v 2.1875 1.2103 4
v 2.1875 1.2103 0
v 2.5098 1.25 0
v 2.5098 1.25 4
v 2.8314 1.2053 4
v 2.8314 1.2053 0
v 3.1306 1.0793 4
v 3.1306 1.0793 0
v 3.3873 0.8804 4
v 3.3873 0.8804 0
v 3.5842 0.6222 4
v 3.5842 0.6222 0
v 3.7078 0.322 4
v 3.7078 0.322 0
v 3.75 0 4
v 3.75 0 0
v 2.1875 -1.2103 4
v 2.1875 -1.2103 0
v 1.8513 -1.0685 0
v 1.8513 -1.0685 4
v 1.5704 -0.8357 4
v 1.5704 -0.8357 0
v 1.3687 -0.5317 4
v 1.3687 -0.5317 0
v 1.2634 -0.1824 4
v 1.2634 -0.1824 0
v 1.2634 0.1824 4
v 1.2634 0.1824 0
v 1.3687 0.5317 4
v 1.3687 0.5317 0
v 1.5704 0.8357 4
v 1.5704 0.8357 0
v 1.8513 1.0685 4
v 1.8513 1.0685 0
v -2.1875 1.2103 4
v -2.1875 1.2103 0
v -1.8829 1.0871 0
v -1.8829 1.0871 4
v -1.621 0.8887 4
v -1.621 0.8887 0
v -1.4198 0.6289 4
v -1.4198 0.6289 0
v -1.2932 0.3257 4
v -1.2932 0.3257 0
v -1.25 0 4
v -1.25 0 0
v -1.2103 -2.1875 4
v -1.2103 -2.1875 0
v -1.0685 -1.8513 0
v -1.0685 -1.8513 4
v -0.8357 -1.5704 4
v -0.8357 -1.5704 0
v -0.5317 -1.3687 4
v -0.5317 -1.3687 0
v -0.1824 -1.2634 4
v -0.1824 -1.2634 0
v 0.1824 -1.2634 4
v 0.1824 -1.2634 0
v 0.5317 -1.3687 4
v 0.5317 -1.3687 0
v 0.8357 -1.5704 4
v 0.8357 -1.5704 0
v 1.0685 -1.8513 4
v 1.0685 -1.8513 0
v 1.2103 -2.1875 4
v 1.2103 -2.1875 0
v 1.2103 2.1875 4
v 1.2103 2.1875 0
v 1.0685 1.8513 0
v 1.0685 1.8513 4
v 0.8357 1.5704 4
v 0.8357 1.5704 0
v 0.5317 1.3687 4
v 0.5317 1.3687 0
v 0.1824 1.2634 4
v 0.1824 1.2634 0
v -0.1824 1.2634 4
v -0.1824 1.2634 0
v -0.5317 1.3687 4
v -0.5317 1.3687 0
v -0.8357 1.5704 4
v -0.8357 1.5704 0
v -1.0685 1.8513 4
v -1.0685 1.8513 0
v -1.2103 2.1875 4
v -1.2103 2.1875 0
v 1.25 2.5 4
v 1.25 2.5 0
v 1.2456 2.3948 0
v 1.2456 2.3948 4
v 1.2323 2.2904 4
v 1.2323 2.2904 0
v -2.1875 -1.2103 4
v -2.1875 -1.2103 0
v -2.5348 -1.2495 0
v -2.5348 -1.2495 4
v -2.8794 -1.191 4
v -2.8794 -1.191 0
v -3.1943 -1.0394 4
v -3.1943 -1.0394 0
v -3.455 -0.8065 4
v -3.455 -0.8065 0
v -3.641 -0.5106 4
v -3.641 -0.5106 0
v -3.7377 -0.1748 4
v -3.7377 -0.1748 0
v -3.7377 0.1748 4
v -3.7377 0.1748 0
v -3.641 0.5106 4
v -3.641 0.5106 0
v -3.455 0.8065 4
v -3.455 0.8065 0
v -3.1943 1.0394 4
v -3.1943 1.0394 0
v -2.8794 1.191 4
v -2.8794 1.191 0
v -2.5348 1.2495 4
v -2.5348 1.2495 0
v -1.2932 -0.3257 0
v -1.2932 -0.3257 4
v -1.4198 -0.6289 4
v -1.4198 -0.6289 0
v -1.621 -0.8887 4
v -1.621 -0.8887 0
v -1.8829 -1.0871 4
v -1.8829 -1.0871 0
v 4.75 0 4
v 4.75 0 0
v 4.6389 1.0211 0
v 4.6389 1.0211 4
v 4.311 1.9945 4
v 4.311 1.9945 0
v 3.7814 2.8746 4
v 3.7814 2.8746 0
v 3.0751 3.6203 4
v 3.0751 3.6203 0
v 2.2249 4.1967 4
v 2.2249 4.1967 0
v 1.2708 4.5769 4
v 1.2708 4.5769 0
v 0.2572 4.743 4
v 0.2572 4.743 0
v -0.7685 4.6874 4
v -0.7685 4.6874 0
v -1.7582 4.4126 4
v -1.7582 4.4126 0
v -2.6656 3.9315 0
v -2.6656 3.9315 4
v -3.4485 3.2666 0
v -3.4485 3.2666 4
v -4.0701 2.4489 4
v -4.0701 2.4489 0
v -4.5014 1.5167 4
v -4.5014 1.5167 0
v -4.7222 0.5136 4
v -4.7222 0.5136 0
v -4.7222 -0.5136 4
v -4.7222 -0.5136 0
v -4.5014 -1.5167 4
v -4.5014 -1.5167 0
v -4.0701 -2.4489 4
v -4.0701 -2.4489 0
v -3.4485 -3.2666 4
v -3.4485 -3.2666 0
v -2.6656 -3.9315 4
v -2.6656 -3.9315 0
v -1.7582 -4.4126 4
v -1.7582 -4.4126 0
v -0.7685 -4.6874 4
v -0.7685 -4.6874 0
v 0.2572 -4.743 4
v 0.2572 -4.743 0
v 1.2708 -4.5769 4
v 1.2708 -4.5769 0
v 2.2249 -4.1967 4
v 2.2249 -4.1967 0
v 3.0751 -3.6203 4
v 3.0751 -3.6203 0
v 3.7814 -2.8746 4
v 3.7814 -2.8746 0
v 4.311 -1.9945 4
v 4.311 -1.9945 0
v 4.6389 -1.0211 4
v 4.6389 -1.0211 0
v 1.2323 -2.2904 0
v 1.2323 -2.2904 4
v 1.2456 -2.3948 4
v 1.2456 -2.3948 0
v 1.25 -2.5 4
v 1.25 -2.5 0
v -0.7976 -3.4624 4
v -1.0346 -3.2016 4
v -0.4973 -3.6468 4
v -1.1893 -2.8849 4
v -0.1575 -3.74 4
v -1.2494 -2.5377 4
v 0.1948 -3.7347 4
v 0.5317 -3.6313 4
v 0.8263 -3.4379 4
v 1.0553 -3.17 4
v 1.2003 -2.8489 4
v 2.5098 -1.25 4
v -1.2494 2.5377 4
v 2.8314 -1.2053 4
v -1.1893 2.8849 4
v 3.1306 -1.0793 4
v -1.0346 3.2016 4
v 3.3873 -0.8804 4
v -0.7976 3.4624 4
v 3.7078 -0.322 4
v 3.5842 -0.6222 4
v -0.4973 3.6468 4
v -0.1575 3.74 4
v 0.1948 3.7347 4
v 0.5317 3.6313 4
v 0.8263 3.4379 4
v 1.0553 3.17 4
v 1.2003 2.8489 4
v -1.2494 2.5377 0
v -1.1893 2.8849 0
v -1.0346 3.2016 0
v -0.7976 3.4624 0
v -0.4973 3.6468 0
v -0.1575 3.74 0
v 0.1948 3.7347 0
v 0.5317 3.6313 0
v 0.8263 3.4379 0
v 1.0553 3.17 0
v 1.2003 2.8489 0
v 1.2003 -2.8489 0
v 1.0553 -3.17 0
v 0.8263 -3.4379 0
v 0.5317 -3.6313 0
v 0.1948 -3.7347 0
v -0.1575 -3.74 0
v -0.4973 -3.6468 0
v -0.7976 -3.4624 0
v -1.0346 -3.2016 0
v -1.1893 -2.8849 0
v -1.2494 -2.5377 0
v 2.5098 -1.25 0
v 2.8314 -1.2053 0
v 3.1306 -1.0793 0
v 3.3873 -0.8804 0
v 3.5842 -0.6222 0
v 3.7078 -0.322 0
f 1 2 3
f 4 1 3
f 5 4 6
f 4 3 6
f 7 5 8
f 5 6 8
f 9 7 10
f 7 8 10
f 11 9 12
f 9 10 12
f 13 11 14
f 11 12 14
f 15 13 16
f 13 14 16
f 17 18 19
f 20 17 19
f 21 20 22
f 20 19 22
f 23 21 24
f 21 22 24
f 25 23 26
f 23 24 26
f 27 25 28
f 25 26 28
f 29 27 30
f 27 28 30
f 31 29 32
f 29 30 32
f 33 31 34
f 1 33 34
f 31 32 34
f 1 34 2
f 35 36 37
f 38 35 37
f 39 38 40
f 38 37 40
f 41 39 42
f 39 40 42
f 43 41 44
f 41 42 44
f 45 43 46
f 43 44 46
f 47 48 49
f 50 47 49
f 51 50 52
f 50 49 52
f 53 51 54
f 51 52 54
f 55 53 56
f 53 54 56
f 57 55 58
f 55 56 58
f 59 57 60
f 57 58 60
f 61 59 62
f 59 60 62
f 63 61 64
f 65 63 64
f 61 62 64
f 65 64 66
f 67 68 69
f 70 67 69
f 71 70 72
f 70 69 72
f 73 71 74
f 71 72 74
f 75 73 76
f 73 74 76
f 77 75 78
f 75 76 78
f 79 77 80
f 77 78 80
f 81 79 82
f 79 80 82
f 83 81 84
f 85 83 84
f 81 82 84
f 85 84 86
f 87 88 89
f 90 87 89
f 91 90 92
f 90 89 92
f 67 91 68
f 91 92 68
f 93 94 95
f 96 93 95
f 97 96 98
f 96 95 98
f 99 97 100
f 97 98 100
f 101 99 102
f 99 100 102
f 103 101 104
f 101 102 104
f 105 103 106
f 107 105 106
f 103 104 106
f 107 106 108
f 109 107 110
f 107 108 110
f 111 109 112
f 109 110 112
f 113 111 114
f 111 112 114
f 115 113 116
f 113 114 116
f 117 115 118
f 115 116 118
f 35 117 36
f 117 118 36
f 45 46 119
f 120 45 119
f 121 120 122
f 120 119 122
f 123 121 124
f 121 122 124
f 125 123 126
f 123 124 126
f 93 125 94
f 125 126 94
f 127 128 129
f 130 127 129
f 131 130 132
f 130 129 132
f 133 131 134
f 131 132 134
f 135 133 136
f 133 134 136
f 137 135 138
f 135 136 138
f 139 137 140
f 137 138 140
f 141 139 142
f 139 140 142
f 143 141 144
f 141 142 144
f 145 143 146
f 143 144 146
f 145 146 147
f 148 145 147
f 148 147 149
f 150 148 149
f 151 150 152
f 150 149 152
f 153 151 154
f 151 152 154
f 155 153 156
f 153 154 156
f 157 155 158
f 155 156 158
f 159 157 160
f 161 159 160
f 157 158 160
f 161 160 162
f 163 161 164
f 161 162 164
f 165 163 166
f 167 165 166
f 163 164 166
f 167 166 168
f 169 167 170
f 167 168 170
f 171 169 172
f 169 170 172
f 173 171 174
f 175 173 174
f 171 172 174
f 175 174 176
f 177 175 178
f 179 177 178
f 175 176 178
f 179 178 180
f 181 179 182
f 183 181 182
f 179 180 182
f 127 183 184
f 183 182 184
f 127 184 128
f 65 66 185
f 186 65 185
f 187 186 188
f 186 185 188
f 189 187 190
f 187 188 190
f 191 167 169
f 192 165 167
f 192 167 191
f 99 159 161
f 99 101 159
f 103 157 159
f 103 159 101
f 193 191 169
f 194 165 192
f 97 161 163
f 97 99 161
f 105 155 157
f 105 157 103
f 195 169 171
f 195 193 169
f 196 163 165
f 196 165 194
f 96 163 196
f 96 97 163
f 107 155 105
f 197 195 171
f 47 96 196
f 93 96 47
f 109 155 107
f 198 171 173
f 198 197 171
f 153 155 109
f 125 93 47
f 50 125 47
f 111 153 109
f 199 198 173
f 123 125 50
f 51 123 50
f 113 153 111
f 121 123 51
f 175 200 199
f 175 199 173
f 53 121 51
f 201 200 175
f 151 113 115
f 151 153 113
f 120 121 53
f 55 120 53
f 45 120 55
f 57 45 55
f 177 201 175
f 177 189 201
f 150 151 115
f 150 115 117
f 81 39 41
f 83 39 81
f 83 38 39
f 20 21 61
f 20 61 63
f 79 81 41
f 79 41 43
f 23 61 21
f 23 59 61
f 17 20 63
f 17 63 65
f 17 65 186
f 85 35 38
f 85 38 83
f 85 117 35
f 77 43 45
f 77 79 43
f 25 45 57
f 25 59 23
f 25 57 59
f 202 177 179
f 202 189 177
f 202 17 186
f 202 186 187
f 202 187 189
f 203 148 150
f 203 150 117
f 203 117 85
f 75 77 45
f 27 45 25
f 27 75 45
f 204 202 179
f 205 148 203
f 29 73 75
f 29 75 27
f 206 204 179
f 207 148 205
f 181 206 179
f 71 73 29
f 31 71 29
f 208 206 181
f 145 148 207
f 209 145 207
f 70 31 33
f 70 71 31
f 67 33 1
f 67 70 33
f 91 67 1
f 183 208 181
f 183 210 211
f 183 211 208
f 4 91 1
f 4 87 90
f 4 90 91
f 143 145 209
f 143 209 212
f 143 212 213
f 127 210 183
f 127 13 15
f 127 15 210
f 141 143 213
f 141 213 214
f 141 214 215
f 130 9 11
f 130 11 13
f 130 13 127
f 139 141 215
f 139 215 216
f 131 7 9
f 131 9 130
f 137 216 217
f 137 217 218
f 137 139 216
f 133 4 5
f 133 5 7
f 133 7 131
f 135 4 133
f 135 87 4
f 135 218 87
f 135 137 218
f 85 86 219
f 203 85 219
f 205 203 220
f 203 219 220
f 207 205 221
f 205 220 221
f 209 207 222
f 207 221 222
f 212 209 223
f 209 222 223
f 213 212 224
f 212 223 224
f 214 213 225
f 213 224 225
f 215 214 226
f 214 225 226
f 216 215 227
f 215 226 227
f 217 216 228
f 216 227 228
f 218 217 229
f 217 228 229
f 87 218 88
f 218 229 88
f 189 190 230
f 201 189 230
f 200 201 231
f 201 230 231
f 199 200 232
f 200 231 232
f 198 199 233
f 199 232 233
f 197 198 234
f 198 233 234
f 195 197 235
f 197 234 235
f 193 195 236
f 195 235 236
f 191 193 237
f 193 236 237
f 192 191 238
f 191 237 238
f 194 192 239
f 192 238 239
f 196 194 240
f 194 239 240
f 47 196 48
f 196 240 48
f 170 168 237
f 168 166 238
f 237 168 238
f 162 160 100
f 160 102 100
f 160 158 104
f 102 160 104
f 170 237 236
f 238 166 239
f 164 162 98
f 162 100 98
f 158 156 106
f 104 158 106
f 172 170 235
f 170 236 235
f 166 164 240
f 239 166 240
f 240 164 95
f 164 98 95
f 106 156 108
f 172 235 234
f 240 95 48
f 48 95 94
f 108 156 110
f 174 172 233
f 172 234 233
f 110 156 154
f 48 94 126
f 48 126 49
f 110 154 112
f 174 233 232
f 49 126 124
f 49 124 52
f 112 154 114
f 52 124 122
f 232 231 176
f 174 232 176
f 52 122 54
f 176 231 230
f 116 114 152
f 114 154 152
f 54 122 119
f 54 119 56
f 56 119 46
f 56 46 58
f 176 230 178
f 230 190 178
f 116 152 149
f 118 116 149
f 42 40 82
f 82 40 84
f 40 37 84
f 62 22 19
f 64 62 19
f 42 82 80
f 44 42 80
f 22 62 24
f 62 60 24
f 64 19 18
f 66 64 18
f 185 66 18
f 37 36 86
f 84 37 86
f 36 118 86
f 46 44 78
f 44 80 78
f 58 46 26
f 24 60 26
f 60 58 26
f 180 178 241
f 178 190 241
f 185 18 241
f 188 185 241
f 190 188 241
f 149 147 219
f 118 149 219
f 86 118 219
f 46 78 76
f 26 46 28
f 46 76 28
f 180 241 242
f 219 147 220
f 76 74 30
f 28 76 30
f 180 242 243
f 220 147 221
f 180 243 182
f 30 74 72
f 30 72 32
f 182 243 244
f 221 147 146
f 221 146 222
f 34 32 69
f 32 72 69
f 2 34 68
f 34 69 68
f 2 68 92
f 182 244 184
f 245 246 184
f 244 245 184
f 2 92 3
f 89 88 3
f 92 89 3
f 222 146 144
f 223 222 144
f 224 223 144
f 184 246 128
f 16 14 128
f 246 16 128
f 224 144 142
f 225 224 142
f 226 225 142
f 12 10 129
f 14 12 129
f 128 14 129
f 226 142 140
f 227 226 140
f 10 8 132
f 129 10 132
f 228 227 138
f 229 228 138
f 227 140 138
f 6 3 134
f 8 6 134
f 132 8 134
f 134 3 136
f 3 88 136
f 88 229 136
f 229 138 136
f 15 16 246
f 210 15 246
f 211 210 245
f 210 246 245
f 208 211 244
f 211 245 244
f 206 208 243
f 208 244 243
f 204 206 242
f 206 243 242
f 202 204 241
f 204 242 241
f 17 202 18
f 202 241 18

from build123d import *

# Parameters (mm, degrees)
CROQUIS1_R              = 4.75
SALIENTE_EXTRUIR1_DEPTH = 4


with BuildPart() as part:
    # Croquis1 → Saliente-Extruir1 (new body)
    # profile 1 of 2: a face of its own
    with BuildSketch(Plane.XY):
        Circle(CROQUIS1_R)
        with BuildLine():
            ThreePointArc((-2.1875, 1.210307296), (-1.767766953, 1.767766953), (-1.210307296, 2.1875))
            ThreePointArc((-1.210307296, 2.1875), (-0.157505366, 3.74003712), (1.25, 2.5))
            ThreePointArc((1.25, 2.5), (1.24003712, 2.342494634), (1.210307296, 2.1875))
            ThreePointArc((1.210307296, 2.1875), (1.767766953, 1.767766953), (2.1875, 1.210307296))
            ThreePointArc((2.1875, 1.210307296), (3.265465545, 0.988211769), (3.75, 0))
            ThreePointArc((3.75, 0), (3.265465545, -0.988211769), (2.1875, -1.210307296))
            ThreePointArc((2.1875, -1.210307296), (1.767766953, -1.767766953), (1.210307296, -2.1875))
            ThreePointArc((1.210307296, -2.1875), (1.24003712, -2.342494634), (1.25, -2.5))
            ThreePointArc((1.25, -2.5), (-0.157505366, -3.74003712), (-1.210307296, -2.1875))
            ThreePointArc((-1.210307296, -2.1875), (-1.767766953, -1.767766953), (-2.1875, -1.210307296))
            ThreePointArc((-2.1875, -1.210307296), (-3.75, 0), (-2.1875, 1.210307296))
        make_face(mode=Mode.SUBTRACT)
    # profile 2 of 2: a face of its own
    with BuildSketch(Plane.XY):
        with BuildLine():
            ThreePointArc((1.210307296, 2.1875), (0, 1.25), (-1.210307296, 2.1875))
            ThreePointArc((-1.210307296, 2.1875), (-1.767766953, 1.767766953), (-2.1875, 1.210307296))
            ThreePointArc((-2.1875, 1.210307296), (-1.511788231, 0.765465545), (-1.25, 0))
            ThreePointArc((-1.25, 0), (-1.511788231, -0.765465545), (-2.1875, -1.210307296))
            ThreePointArc((-2.1875, -1.210307296), (-1.767766953, -1.767766953), (-1.210307296, -2.1875))
            ThreePointArc((-1.210307296, -2.1875), (0, -1.25), (1.210307296, -2.1875))
            ThreePointArc((1.210307296, -2.1875), (1.767766953, -1.767766953), (2.1875, -1.210307296))
            ThreePointArc((2.1875, -1.210307296), (1.25, 0), (2.1875, 1.210307296))
            ThreePointArc((2.1875, 1.210307296), (1.767766953, 1.767766953), (1.210307296, 2.1875))
        make_face()
    extrude(amount=SALIENTE_EXTRUIR1_DEPTH)


solid = part.part
